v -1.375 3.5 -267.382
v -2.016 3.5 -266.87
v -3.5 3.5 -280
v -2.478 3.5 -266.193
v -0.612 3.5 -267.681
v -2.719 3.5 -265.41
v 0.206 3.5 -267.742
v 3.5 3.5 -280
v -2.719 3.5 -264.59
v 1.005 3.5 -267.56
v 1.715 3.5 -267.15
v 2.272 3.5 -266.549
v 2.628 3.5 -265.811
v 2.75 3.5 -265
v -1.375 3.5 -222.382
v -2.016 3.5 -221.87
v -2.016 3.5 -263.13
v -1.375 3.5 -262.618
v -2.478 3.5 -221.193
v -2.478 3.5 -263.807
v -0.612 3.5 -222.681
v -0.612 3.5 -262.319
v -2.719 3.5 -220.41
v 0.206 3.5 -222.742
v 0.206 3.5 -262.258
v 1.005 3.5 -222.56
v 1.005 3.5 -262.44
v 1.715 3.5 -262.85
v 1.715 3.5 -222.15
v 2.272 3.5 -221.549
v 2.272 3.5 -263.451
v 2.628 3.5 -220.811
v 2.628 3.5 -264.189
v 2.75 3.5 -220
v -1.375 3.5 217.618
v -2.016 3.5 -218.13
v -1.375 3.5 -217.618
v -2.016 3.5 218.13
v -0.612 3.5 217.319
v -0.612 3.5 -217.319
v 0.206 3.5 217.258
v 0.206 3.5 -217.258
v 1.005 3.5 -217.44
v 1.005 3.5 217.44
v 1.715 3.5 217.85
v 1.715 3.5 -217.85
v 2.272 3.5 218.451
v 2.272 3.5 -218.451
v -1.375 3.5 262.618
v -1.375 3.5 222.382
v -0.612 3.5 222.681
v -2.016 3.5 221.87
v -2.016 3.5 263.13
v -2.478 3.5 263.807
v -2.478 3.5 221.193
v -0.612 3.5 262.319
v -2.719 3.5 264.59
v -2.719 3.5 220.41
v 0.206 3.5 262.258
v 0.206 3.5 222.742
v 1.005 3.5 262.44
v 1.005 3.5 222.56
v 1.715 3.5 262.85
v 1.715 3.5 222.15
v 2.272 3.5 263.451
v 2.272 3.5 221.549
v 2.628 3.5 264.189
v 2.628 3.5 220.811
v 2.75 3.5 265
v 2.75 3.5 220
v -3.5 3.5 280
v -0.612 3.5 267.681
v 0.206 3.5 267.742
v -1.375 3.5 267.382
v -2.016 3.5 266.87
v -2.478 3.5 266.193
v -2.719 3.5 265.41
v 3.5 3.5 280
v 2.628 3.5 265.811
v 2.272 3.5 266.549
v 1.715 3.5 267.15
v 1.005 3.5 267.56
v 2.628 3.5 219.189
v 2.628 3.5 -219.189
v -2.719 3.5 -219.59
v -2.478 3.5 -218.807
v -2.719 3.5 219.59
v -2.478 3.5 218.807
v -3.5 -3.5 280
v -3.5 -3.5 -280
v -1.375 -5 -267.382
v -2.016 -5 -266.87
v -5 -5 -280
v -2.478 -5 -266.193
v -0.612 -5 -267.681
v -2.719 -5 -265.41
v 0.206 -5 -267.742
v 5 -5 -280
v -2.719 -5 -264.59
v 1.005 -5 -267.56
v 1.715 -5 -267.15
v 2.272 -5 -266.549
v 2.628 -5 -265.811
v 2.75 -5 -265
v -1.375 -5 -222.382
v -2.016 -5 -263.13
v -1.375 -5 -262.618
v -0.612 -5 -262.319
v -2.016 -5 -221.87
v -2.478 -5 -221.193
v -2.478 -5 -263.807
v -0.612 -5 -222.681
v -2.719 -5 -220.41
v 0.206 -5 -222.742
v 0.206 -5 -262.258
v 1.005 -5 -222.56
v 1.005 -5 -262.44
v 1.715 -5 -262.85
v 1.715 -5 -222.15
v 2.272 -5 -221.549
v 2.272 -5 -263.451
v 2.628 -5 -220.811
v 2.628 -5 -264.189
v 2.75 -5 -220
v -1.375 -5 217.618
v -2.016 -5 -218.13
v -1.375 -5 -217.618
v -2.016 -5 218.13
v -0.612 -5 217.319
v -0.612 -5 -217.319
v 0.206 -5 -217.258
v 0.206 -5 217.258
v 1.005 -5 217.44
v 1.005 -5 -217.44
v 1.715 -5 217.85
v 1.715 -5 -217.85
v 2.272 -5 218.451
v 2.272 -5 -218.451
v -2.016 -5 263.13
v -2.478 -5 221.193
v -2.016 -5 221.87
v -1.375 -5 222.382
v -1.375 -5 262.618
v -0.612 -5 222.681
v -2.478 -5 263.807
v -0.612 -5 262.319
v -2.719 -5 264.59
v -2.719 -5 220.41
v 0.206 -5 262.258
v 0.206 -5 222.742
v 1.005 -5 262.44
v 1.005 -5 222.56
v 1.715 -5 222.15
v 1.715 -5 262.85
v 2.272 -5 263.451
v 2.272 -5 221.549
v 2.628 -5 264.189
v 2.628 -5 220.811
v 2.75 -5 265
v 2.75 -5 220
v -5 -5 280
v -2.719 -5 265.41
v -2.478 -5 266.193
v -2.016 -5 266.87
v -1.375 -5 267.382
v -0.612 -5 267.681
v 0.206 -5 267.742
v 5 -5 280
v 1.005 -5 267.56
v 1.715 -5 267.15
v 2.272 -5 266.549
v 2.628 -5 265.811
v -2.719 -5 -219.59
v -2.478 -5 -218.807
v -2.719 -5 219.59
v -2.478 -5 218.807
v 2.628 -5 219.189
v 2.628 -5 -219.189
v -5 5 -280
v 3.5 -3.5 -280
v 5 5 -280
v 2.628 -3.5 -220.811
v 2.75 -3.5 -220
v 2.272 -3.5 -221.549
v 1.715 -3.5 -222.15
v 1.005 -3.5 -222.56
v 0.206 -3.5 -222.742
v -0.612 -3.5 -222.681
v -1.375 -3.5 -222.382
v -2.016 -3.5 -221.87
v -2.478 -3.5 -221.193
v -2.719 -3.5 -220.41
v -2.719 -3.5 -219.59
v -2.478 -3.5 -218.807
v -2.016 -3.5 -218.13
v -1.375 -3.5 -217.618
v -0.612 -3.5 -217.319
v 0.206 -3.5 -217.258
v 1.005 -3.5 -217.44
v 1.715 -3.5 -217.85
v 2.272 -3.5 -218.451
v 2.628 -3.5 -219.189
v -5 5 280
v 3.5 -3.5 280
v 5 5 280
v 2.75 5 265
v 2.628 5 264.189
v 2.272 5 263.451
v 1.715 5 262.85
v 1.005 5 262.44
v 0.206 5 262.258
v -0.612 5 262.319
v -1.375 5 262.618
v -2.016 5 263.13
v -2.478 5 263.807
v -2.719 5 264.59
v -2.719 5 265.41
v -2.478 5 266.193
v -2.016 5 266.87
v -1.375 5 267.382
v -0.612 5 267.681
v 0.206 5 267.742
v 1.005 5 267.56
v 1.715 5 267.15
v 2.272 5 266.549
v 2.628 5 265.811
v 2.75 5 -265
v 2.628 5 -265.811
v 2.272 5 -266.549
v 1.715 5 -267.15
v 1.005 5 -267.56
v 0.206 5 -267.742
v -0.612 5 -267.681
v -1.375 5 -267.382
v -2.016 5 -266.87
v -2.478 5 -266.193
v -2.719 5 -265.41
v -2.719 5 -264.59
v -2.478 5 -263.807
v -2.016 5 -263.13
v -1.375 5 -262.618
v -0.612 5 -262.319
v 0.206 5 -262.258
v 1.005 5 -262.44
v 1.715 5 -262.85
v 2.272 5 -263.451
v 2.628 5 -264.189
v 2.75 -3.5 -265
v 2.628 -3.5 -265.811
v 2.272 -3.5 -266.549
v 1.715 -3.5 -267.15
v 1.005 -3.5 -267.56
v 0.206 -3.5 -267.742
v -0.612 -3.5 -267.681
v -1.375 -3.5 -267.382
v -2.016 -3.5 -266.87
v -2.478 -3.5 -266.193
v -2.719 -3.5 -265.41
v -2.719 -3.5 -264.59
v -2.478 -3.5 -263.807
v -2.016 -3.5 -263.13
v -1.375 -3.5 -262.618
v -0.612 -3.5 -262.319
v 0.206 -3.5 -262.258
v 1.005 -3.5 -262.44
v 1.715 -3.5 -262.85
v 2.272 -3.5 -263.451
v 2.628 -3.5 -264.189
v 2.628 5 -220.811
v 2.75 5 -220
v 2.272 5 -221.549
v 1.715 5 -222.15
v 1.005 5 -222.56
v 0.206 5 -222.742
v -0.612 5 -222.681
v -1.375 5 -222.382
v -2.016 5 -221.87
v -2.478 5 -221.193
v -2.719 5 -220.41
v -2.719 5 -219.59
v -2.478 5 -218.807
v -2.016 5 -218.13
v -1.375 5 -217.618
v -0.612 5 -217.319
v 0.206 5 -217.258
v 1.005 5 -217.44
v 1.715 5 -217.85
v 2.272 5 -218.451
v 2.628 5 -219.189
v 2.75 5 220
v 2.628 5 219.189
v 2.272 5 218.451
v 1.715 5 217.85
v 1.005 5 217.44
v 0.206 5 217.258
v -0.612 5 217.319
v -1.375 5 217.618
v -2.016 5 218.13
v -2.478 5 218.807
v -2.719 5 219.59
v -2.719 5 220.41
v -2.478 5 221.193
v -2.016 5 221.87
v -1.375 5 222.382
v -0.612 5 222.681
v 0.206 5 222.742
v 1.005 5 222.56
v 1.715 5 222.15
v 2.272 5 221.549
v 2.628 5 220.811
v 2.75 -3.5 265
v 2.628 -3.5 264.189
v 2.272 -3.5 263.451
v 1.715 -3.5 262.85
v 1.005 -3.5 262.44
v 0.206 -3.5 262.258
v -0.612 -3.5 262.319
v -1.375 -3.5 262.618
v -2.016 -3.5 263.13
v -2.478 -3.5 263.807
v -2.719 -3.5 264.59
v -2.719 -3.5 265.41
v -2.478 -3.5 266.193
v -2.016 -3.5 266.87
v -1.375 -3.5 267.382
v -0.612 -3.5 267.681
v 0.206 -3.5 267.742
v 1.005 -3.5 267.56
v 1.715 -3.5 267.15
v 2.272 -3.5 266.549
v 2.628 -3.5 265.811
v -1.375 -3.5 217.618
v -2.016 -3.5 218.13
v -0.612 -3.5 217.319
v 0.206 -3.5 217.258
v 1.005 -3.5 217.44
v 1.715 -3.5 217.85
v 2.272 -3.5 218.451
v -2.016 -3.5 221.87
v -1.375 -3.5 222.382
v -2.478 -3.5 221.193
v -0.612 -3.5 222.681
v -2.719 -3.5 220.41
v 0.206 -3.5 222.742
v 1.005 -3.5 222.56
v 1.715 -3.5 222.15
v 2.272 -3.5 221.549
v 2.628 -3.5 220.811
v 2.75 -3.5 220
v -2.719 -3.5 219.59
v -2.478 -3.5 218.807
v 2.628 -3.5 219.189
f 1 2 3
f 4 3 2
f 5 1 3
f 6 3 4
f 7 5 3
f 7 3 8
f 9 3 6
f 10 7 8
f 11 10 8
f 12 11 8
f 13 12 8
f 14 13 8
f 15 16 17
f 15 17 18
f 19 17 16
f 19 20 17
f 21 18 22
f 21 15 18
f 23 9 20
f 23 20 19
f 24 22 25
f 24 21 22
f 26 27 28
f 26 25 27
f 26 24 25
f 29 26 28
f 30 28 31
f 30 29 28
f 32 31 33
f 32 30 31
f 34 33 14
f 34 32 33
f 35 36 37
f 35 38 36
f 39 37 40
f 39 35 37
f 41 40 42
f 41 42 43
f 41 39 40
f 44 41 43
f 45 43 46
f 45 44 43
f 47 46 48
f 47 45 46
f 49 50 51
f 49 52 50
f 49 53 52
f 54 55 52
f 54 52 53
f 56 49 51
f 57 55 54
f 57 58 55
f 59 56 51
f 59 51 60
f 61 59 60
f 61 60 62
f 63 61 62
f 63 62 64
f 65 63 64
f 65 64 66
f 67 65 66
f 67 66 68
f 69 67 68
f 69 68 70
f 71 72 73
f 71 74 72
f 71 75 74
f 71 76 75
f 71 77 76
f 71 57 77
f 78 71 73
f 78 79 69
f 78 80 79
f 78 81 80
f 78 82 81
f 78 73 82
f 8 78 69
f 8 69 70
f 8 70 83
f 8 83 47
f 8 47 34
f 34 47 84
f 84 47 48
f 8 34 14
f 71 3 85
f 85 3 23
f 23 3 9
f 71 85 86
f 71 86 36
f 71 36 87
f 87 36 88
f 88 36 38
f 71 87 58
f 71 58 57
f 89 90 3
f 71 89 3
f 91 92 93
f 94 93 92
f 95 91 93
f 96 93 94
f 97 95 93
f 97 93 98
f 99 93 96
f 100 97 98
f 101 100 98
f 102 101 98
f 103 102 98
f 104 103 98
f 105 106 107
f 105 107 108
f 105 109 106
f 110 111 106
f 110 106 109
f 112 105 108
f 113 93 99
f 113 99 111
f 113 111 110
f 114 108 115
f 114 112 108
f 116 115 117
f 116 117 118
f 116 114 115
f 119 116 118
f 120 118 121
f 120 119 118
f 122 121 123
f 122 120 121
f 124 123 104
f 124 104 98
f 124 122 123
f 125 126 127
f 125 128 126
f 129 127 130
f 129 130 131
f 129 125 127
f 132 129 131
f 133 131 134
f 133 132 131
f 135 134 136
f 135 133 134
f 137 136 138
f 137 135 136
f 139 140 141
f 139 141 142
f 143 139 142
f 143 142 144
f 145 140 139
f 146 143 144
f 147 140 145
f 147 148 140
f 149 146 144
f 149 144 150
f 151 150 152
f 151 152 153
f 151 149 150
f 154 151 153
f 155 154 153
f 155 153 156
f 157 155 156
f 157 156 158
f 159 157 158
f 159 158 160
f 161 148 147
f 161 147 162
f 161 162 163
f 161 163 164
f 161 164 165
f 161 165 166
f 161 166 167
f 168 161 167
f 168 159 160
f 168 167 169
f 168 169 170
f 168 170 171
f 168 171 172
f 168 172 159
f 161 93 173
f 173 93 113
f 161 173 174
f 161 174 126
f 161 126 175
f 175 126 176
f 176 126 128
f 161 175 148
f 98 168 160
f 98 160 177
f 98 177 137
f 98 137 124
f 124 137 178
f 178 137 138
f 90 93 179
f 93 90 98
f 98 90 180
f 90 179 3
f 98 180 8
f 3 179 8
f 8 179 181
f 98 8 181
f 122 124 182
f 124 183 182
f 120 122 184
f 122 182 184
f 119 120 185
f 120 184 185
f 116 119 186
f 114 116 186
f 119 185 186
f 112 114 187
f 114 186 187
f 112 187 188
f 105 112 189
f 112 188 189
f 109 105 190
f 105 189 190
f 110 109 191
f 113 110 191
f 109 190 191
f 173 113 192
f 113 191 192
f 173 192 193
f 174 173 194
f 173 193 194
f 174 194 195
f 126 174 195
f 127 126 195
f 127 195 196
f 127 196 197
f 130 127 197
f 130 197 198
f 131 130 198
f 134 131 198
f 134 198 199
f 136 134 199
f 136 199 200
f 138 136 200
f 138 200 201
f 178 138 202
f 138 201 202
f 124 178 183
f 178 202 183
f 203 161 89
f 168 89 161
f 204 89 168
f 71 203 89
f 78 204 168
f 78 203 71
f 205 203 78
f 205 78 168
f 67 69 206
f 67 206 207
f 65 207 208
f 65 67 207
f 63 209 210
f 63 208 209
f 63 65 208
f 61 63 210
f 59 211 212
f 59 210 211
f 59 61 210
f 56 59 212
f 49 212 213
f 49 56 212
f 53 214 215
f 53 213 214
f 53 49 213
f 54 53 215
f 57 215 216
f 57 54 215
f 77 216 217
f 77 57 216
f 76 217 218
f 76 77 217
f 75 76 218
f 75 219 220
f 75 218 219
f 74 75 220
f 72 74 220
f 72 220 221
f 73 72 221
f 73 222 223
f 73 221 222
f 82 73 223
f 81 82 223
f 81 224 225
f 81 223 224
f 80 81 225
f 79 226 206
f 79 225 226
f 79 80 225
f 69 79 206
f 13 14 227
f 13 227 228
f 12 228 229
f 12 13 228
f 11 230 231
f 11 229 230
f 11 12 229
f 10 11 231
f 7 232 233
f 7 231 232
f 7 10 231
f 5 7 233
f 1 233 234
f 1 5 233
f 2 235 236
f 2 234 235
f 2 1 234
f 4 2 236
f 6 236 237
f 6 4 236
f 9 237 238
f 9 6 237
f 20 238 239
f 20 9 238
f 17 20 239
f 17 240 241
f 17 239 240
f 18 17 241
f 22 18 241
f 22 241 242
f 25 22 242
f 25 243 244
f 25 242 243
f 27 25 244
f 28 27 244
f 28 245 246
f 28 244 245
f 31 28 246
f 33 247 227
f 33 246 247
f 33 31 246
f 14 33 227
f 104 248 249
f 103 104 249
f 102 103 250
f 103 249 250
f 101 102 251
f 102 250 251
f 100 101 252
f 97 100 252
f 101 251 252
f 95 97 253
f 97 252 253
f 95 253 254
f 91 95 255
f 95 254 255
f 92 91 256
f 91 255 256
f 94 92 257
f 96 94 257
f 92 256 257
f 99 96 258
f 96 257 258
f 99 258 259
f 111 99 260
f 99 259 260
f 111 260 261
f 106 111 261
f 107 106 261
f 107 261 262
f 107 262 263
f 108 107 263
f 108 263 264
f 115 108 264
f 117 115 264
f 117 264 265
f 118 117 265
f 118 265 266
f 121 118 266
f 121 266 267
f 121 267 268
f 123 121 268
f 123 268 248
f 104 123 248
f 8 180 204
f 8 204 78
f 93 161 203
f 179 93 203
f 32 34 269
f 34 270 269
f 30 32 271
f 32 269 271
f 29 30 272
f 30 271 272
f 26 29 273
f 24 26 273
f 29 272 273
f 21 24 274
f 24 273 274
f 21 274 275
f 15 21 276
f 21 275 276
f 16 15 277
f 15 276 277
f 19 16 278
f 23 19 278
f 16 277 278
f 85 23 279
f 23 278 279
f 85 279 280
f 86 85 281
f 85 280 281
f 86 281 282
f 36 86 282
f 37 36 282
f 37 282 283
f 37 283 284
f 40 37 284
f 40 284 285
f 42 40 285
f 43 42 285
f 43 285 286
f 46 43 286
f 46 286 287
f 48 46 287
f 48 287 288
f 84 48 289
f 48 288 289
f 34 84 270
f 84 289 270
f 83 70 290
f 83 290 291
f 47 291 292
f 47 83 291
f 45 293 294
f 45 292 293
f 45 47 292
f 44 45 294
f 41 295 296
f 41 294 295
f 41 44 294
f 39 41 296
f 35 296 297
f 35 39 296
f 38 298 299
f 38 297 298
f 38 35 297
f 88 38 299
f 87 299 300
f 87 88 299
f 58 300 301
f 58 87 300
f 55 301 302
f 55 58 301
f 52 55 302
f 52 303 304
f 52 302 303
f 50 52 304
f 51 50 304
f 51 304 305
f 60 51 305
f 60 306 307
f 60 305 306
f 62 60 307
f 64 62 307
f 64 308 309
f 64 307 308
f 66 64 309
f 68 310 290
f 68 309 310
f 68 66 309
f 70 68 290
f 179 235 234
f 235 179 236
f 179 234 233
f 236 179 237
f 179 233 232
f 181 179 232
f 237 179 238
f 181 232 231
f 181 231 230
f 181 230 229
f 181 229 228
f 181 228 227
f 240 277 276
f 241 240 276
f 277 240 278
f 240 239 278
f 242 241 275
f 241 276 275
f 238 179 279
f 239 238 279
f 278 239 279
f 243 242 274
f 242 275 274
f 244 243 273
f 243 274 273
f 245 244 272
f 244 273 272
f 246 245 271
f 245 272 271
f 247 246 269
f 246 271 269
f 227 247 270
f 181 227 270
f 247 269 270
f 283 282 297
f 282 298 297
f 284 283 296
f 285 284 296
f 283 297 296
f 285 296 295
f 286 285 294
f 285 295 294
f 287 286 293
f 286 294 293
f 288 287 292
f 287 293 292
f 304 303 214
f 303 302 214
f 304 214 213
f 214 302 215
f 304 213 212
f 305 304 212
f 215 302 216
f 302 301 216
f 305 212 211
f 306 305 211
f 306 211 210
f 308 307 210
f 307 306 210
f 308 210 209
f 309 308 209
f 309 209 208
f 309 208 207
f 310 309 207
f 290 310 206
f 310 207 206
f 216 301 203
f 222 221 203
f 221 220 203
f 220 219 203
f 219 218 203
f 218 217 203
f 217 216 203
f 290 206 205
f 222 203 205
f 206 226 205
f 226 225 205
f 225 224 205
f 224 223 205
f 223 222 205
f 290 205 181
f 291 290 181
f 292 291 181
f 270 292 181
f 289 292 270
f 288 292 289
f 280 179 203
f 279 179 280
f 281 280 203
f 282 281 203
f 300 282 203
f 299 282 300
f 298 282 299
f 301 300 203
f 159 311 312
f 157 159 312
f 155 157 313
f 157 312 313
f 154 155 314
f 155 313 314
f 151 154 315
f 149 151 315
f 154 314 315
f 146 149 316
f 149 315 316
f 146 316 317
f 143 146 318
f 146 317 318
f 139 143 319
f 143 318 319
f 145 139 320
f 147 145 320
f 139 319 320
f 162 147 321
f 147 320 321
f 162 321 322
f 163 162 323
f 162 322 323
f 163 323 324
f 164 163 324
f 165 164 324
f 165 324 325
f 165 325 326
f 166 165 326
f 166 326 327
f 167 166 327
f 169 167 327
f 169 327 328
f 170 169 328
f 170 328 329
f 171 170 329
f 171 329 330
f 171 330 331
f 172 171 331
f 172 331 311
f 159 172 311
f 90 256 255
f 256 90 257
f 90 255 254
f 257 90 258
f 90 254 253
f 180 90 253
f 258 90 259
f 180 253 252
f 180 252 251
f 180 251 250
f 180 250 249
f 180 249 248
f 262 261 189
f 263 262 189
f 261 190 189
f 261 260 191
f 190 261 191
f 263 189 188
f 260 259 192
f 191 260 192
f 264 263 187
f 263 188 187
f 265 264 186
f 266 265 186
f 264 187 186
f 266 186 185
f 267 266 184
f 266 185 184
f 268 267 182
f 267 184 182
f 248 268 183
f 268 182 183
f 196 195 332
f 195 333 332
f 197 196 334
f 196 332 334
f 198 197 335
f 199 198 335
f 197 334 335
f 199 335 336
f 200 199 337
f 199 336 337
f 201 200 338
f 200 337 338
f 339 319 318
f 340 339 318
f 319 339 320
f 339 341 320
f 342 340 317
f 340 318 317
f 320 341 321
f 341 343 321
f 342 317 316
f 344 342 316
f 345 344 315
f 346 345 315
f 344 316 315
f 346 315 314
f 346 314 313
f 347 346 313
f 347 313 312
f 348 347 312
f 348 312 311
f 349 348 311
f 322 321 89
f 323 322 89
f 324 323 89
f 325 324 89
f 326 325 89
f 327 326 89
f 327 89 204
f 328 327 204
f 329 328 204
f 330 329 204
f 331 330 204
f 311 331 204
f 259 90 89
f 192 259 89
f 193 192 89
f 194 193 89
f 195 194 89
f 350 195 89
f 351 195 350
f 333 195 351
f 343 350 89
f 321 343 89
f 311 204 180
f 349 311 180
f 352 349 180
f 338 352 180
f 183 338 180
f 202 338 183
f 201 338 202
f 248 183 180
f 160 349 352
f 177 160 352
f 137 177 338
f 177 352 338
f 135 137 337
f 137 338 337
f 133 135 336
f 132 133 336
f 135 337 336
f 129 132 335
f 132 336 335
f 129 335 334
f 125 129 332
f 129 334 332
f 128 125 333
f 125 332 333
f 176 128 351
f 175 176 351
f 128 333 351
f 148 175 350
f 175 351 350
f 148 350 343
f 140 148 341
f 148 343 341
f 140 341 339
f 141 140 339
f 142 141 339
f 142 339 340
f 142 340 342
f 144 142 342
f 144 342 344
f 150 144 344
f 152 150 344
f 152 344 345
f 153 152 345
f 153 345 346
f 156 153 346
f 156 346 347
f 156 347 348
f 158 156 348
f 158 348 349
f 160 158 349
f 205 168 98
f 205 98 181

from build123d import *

# Parameters (mm, degrees)
SKIZZE1_W                       = 10
SKIZZE1_H                       = 10
SKIZZE1_W_2                     = 7
SKIZZE1_H_2                     = 7
AUFSATZ_LINEAR_AUSTRAGEN1_DEPTH = 280
SKIZZE2_R                       = 2.75
SCHNITT_LINEAR_AUSTRAGEN1_DEPTH = 15


with BuildPart() as part:
    # Skizze1 → Aufsatz-Linear austragen1 (new, symmetric)
    with BuildSketch(Plane.XY):
        Rectangle(SKIZZE1_W, SKIZZE1_H)
        Rectangle(SKIZZE1_W_2, SKIZZE1_H_2, mode=Mode.SUBTRACT)
    extrude(amount=AUFSATZ_LINEAR_AUSTRAGEN1_DEPTH, both=True)

    # Skizze2 → Schnitt-Linear austragen1 (cut, symmetric)
    with BuildSketch(Plane(origin=(0, 0, 0), x_dir=(1, 0, 0), z_dir=(0, 1, 0))):
        with Locations((0, -265)):
            Circle(SKIZZE2_R)
        with Locations((0, 265)):
            Circle(SKIZZE2_R)
        with Locations((0, -220)):
            Circle(SKIZZE2_R)
        with Locations((0, 220)):
            Circle(SKIZZE2_R)
    extrude(amount=SCHNITT_LINEAR_AUSTRAGEN1_DEPTH, both=True, mode=Mode.SUBTRACT)


solid = part.part
